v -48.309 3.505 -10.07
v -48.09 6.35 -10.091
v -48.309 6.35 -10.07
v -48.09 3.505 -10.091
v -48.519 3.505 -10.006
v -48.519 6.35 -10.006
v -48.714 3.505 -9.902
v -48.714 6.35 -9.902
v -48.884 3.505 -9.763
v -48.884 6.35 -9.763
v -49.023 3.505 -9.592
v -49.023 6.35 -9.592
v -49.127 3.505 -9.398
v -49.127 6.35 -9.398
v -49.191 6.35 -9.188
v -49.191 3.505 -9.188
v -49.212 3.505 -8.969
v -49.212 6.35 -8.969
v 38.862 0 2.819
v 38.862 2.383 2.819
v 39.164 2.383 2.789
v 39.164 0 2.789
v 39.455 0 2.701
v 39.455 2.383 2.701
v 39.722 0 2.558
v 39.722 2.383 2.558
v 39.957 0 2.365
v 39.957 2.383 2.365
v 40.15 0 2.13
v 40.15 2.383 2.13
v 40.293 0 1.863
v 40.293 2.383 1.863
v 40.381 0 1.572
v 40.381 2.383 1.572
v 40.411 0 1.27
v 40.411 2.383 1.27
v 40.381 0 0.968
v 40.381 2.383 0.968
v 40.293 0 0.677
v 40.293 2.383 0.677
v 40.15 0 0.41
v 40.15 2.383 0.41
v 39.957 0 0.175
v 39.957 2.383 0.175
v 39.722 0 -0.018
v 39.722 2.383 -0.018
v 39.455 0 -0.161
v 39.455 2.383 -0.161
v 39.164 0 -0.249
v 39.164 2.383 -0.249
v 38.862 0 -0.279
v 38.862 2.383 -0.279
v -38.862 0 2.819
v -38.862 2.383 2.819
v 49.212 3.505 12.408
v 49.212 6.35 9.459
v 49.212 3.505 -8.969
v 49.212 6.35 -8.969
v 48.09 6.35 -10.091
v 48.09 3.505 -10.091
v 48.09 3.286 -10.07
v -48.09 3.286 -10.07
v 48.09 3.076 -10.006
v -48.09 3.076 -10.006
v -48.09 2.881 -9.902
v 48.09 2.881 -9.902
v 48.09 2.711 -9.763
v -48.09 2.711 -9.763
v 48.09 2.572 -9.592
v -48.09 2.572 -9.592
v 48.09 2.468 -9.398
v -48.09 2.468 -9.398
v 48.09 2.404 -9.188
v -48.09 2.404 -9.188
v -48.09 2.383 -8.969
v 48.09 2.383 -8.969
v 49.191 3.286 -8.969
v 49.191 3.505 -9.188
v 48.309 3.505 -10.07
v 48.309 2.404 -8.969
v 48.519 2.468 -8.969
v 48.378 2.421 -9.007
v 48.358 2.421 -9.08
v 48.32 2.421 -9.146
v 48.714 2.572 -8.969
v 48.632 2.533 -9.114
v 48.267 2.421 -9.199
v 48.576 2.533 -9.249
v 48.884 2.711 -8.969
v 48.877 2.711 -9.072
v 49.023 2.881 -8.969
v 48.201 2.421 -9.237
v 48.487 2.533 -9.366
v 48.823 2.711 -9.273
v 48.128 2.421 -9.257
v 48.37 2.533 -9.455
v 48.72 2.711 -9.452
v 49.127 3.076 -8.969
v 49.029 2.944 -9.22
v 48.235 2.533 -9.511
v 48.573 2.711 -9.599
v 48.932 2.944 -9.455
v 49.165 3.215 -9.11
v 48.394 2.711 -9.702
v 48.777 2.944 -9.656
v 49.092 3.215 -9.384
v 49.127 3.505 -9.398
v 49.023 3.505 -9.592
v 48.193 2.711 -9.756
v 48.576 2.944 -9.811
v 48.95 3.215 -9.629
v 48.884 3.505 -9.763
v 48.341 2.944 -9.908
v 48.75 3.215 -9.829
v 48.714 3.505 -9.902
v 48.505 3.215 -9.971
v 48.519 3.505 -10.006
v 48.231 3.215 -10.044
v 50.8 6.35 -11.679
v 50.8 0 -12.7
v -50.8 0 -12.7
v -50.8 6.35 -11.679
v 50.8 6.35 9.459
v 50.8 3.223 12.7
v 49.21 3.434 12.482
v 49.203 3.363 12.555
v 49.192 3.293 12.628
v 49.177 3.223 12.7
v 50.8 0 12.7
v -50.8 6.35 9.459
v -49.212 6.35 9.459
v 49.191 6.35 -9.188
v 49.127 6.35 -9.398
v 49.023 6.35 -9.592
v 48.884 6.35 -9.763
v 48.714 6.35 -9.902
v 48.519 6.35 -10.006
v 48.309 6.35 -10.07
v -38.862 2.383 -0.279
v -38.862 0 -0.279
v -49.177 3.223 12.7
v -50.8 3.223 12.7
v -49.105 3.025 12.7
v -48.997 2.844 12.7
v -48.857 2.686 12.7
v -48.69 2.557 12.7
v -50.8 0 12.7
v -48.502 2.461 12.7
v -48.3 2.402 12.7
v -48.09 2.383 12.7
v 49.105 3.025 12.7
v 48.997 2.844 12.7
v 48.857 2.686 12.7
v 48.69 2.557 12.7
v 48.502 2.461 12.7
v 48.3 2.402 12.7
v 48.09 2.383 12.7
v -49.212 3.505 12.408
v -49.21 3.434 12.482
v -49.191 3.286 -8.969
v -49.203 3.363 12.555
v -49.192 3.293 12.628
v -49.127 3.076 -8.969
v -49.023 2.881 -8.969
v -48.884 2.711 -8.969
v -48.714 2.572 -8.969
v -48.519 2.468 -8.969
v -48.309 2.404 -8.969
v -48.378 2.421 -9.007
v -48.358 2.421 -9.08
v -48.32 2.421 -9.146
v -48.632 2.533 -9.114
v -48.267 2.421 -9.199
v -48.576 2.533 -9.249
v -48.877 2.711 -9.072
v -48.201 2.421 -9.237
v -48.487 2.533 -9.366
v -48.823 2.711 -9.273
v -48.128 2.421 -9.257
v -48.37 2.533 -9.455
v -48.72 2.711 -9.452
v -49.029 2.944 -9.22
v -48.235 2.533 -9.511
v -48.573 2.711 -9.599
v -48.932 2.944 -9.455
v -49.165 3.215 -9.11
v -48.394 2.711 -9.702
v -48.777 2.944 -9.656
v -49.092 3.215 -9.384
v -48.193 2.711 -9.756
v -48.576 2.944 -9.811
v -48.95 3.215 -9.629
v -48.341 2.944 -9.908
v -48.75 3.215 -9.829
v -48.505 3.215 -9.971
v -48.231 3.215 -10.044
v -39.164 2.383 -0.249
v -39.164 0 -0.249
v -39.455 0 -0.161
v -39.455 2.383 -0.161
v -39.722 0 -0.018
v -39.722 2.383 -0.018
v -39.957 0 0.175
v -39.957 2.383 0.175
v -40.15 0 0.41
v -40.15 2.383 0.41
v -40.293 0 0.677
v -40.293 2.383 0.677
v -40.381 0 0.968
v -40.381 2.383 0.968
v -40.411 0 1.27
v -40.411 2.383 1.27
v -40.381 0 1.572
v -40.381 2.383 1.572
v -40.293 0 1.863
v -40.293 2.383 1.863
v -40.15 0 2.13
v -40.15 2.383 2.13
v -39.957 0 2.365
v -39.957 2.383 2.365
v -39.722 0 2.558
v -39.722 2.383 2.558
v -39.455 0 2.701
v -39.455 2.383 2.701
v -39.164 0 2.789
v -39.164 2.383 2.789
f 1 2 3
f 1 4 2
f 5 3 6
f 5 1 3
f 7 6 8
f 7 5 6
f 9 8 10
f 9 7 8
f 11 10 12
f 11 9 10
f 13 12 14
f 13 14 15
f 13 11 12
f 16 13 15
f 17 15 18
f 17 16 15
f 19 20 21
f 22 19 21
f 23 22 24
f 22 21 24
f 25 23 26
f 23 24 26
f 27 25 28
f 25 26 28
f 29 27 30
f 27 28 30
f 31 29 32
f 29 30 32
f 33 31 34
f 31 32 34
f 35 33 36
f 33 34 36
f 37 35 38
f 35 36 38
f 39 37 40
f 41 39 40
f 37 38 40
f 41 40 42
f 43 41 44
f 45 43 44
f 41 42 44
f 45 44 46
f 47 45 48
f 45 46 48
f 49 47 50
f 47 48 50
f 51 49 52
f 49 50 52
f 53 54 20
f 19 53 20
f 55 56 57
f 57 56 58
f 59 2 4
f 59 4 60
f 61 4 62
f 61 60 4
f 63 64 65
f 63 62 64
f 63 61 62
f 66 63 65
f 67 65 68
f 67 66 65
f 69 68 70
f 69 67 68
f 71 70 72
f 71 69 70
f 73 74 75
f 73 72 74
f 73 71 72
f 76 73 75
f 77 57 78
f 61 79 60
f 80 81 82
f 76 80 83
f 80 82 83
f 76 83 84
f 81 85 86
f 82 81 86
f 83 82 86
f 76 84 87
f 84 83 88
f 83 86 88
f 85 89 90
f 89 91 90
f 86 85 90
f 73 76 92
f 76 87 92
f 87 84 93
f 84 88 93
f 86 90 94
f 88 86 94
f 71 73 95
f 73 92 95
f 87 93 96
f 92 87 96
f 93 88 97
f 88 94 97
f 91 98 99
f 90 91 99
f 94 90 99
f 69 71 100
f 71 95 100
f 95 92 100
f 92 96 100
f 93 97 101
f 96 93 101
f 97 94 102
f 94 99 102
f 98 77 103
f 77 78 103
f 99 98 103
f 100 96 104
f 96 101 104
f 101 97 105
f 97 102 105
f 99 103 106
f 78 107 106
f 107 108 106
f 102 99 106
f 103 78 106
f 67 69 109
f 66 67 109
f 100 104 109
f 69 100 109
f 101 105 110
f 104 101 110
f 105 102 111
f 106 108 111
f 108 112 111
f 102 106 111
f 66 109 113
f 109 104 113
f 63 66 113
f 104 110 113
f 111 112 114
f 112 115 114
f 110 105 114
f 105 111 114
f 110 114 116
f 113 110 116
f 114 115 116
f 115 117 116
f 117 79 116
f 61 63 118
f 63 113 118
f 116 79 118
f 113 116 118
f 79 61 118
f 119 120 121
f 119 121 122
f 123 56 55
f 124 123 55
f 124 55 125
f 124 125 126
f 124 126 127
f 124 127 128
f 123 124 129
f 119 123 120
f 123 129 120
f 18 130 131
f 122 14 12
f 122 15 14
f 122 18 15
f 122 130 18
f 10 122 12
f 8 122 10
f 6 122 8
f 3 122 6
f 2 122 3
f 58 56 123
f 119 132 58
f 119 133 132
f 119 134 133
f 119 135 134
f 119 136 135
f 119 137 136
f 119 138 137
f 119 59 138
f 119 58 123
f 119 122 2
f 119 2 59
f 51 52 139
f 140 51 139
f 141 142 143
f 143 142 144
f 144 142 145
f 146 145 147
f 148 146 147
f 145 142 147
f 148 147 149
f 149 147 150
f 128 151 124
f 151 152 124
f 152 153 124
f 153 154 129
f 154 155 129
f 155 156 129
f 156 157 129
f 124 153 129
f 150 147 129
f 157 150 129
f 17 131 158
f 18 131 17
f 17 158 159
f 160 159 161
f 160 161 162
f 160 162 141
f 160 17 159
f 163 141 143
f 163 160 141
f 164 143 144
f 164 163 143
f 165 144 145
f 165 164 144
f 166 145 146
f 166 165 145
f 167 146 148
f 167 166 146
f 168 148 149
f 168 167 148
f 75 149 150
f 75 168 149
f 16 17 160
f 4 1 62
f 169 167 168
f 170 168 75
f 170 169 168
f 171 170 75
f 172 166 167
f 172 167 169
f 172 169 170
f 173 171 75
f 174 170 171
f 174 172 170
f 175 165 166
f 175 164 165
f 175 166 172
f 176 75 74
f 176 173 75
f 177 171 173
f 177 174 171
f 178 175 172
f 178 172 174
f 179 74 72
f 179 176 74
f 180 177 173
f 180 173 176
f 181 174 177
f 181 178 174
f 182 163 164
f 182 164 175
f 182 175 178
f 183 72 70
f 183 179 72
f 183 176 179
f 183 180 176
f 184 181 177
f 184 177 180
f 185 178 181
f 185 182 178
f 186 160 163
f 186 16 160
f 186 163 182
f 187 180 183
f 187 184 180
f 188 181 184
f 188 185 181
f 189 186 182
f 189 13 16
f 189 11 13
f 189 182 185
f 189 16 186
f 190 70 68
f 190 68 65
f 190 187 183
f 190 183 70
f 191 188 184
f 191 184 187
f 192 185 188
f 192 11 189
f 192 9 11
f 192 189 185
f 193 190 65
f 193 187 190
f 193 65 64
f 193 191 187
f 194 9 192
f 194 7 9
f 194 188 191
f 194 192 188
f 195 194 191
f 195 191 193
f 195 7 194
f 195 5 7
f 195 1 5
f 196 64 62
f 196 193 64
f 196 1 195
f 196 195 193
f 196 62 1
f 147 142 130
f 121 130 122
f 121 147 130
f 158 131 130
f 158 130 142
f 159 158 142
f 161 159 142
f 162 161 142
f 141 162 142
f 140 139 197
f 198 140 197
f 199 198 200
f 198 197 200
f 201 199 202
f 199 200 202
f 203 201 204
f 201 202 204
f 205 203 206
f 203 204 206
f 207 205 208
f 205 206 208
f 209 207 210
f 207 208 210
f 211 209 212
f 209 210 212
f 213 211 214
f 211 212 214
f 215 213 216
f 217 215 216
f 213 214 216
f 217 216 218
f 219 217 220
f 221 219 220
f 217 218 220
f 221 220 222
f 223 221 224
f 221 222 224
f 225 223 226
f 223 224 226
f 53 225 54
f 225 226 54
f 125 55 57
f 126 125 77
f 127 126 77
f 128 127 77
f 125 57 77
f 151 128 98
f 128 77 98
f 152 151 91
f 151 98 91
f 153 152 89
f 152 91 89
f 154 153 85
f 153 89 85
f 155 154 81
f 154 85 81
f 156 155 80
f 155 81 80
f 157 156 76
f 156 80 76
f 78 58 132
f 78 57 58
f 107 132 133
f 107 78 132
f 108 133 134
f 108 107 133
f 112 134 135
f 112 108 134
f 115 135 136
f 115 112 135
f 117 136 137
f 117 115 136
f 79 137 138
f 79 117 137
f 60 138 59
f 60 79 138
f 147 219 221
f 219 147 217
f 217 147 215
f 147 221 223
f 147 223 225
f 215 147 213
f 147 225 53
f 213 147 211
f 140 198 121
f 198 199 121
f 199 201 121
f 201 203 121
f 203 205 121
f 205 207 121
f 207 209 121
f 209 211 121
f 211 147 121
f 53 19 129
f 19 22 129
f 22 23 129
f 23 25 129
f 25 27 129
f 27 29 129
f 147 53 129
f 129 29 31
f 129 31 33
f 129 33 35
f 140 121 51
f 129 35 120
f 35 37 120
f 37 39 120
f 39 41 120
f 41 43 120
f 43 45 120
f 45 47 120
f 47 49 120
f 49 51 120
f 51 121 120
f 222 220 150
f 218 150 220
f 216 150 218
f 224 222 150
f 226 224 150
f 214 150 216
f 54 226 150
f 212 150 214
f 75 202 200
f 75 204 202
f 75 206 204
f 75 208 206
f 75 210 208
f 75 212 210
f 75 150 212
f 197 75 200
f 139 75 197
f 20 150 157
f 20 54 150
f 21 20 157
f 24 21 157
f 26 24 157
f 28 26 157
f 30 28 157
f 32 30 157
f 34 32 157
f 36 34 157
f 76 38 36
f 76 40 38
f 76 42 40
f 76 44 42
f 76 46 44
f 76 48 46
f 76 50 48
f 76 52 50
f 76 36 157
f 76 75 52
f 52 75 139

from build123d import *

# Parameters (mm, degrees)
SKETCH1_W           = 101.6
SKETCH1_H           = 25.4
BOSS_EXTRUDE1_DEPTH = 6.35
CUT_EXTRUDE2_DEPTH  = 101.6
SKETCH4_W           = 98.425
SKETCH4_H           = 22.79142
CUT_EXTRUDE3_DEPTH  = 3.96748
CUT_EXTRUDE6_DEPTH  = 2.54
CUT_EXTRUDE7_DEPTH  = 1.5875
CUT_EXTRUDE8_DEPTH  = 1.5875
FILLET1_R           = 1.12268


with BuildPart() as part:
    # Sketch1 → Boss-Extrude1 (new body)
    with BuildSketch(Plane(origin=(0, 0, 0), x_dir=(1, 0, 0), z_dir=(0, 1, 0))):
        Rectangle(SKETCH1_W, SKETCH1_H)
    extrude(amount=BOSS_EXTRUDE1_DEPTH)

    # Sketch2 → Cut-Extrude2 (cut)
    with BuildSketch(Plane.ZY.offset(50.8)):
        Polygon((-12.7, 0), (-11.67892, 6.35), (-12.7, 6.35), align=None)
    extrude(amount=-CUT_EXTRUDE2_DEPTH, mode=Mode.SUBTRACT)

    # Sketch4 → Cut-Extrude3 (cut)
    with BuildSketch(Plane(origin=(0, 6.35, 0), x_dir=(1, 0, 0), z_dir=(0, 1, 0))):
        with Locations((0, -1.30429)):
            Rectangle(SKETCH4_W, SKETCH4_H)
    extrude(amount=-CUT_EXTRUDE3_DEPTH, mode=Mode.SUBTRACT)

    # Sketch5 → Cut-Extrude6 (cut)
    with BuildSketch(Plane(origin=(0, 2.38252, 0), x_dir=(1, 0, 0), z_dir=(0, 1, 0))):
        with BuildLine():
            Line((-38.862, -2.818654725), (38.862, -2.818654725))
            ThreePointArc((38.862, -2.818654725), (40.410654725, -1.27), (38.862, 0.278654725))
            Line((38.862, 0.278654725), (-38.862, 0.278654725))
            ThreePointArc((-38.862, 0.278654725), (-40.410654725, -1.27), (-38.862, -2.818654725))
        make_face()
    extrude(amount=-CUT_EXTRUDE6_DEPTH, mode=Mode.SUBTRACT)

    # Sketch6 → Cut-Extrude7 (cut)
    with BuildSketch(Plane(origin=(-49.2125, 0, 0), x_dir=(0, 0, -1), z_dir=(1, 0, 0))):
        Polygon((-9.45896, 6.35), (-12.7, 3.22326), (-12.7, 6.35), align=None)
    extrude(amount=-CUT_EXTRUDE7_DEPTH, mode=Mode.SUBTRACT)

    # Sketch7 → Cut-Extrude8 (cut)
    with BuildSketch(Plane.ZY.offset(-49.2125)):
        Polygon((9.45896, 6.35), (12.7, 3.22326), (12.7, 6.35), align=None)
    extrude(amount=-CUT_EXTRUDE8_DEPTH, mode=Mode.SUBTRACT)

    # Fillet1
    fillet1_edges = [part.edges().sort_by_distance(p)[0] for p in [
        (49.2125, 4.36626, -10.09142),
        (49.2125, 2.38252, 1.30429),
        (-49.2125, 4.36626, -10.09142),
        (-49.2125, 2.38252, 1.30429),
        (0, 2.38252, -10.09142),
    ]]
    fillet(fillet1_edges, radius=FILLET1_R)


solid = part.part
